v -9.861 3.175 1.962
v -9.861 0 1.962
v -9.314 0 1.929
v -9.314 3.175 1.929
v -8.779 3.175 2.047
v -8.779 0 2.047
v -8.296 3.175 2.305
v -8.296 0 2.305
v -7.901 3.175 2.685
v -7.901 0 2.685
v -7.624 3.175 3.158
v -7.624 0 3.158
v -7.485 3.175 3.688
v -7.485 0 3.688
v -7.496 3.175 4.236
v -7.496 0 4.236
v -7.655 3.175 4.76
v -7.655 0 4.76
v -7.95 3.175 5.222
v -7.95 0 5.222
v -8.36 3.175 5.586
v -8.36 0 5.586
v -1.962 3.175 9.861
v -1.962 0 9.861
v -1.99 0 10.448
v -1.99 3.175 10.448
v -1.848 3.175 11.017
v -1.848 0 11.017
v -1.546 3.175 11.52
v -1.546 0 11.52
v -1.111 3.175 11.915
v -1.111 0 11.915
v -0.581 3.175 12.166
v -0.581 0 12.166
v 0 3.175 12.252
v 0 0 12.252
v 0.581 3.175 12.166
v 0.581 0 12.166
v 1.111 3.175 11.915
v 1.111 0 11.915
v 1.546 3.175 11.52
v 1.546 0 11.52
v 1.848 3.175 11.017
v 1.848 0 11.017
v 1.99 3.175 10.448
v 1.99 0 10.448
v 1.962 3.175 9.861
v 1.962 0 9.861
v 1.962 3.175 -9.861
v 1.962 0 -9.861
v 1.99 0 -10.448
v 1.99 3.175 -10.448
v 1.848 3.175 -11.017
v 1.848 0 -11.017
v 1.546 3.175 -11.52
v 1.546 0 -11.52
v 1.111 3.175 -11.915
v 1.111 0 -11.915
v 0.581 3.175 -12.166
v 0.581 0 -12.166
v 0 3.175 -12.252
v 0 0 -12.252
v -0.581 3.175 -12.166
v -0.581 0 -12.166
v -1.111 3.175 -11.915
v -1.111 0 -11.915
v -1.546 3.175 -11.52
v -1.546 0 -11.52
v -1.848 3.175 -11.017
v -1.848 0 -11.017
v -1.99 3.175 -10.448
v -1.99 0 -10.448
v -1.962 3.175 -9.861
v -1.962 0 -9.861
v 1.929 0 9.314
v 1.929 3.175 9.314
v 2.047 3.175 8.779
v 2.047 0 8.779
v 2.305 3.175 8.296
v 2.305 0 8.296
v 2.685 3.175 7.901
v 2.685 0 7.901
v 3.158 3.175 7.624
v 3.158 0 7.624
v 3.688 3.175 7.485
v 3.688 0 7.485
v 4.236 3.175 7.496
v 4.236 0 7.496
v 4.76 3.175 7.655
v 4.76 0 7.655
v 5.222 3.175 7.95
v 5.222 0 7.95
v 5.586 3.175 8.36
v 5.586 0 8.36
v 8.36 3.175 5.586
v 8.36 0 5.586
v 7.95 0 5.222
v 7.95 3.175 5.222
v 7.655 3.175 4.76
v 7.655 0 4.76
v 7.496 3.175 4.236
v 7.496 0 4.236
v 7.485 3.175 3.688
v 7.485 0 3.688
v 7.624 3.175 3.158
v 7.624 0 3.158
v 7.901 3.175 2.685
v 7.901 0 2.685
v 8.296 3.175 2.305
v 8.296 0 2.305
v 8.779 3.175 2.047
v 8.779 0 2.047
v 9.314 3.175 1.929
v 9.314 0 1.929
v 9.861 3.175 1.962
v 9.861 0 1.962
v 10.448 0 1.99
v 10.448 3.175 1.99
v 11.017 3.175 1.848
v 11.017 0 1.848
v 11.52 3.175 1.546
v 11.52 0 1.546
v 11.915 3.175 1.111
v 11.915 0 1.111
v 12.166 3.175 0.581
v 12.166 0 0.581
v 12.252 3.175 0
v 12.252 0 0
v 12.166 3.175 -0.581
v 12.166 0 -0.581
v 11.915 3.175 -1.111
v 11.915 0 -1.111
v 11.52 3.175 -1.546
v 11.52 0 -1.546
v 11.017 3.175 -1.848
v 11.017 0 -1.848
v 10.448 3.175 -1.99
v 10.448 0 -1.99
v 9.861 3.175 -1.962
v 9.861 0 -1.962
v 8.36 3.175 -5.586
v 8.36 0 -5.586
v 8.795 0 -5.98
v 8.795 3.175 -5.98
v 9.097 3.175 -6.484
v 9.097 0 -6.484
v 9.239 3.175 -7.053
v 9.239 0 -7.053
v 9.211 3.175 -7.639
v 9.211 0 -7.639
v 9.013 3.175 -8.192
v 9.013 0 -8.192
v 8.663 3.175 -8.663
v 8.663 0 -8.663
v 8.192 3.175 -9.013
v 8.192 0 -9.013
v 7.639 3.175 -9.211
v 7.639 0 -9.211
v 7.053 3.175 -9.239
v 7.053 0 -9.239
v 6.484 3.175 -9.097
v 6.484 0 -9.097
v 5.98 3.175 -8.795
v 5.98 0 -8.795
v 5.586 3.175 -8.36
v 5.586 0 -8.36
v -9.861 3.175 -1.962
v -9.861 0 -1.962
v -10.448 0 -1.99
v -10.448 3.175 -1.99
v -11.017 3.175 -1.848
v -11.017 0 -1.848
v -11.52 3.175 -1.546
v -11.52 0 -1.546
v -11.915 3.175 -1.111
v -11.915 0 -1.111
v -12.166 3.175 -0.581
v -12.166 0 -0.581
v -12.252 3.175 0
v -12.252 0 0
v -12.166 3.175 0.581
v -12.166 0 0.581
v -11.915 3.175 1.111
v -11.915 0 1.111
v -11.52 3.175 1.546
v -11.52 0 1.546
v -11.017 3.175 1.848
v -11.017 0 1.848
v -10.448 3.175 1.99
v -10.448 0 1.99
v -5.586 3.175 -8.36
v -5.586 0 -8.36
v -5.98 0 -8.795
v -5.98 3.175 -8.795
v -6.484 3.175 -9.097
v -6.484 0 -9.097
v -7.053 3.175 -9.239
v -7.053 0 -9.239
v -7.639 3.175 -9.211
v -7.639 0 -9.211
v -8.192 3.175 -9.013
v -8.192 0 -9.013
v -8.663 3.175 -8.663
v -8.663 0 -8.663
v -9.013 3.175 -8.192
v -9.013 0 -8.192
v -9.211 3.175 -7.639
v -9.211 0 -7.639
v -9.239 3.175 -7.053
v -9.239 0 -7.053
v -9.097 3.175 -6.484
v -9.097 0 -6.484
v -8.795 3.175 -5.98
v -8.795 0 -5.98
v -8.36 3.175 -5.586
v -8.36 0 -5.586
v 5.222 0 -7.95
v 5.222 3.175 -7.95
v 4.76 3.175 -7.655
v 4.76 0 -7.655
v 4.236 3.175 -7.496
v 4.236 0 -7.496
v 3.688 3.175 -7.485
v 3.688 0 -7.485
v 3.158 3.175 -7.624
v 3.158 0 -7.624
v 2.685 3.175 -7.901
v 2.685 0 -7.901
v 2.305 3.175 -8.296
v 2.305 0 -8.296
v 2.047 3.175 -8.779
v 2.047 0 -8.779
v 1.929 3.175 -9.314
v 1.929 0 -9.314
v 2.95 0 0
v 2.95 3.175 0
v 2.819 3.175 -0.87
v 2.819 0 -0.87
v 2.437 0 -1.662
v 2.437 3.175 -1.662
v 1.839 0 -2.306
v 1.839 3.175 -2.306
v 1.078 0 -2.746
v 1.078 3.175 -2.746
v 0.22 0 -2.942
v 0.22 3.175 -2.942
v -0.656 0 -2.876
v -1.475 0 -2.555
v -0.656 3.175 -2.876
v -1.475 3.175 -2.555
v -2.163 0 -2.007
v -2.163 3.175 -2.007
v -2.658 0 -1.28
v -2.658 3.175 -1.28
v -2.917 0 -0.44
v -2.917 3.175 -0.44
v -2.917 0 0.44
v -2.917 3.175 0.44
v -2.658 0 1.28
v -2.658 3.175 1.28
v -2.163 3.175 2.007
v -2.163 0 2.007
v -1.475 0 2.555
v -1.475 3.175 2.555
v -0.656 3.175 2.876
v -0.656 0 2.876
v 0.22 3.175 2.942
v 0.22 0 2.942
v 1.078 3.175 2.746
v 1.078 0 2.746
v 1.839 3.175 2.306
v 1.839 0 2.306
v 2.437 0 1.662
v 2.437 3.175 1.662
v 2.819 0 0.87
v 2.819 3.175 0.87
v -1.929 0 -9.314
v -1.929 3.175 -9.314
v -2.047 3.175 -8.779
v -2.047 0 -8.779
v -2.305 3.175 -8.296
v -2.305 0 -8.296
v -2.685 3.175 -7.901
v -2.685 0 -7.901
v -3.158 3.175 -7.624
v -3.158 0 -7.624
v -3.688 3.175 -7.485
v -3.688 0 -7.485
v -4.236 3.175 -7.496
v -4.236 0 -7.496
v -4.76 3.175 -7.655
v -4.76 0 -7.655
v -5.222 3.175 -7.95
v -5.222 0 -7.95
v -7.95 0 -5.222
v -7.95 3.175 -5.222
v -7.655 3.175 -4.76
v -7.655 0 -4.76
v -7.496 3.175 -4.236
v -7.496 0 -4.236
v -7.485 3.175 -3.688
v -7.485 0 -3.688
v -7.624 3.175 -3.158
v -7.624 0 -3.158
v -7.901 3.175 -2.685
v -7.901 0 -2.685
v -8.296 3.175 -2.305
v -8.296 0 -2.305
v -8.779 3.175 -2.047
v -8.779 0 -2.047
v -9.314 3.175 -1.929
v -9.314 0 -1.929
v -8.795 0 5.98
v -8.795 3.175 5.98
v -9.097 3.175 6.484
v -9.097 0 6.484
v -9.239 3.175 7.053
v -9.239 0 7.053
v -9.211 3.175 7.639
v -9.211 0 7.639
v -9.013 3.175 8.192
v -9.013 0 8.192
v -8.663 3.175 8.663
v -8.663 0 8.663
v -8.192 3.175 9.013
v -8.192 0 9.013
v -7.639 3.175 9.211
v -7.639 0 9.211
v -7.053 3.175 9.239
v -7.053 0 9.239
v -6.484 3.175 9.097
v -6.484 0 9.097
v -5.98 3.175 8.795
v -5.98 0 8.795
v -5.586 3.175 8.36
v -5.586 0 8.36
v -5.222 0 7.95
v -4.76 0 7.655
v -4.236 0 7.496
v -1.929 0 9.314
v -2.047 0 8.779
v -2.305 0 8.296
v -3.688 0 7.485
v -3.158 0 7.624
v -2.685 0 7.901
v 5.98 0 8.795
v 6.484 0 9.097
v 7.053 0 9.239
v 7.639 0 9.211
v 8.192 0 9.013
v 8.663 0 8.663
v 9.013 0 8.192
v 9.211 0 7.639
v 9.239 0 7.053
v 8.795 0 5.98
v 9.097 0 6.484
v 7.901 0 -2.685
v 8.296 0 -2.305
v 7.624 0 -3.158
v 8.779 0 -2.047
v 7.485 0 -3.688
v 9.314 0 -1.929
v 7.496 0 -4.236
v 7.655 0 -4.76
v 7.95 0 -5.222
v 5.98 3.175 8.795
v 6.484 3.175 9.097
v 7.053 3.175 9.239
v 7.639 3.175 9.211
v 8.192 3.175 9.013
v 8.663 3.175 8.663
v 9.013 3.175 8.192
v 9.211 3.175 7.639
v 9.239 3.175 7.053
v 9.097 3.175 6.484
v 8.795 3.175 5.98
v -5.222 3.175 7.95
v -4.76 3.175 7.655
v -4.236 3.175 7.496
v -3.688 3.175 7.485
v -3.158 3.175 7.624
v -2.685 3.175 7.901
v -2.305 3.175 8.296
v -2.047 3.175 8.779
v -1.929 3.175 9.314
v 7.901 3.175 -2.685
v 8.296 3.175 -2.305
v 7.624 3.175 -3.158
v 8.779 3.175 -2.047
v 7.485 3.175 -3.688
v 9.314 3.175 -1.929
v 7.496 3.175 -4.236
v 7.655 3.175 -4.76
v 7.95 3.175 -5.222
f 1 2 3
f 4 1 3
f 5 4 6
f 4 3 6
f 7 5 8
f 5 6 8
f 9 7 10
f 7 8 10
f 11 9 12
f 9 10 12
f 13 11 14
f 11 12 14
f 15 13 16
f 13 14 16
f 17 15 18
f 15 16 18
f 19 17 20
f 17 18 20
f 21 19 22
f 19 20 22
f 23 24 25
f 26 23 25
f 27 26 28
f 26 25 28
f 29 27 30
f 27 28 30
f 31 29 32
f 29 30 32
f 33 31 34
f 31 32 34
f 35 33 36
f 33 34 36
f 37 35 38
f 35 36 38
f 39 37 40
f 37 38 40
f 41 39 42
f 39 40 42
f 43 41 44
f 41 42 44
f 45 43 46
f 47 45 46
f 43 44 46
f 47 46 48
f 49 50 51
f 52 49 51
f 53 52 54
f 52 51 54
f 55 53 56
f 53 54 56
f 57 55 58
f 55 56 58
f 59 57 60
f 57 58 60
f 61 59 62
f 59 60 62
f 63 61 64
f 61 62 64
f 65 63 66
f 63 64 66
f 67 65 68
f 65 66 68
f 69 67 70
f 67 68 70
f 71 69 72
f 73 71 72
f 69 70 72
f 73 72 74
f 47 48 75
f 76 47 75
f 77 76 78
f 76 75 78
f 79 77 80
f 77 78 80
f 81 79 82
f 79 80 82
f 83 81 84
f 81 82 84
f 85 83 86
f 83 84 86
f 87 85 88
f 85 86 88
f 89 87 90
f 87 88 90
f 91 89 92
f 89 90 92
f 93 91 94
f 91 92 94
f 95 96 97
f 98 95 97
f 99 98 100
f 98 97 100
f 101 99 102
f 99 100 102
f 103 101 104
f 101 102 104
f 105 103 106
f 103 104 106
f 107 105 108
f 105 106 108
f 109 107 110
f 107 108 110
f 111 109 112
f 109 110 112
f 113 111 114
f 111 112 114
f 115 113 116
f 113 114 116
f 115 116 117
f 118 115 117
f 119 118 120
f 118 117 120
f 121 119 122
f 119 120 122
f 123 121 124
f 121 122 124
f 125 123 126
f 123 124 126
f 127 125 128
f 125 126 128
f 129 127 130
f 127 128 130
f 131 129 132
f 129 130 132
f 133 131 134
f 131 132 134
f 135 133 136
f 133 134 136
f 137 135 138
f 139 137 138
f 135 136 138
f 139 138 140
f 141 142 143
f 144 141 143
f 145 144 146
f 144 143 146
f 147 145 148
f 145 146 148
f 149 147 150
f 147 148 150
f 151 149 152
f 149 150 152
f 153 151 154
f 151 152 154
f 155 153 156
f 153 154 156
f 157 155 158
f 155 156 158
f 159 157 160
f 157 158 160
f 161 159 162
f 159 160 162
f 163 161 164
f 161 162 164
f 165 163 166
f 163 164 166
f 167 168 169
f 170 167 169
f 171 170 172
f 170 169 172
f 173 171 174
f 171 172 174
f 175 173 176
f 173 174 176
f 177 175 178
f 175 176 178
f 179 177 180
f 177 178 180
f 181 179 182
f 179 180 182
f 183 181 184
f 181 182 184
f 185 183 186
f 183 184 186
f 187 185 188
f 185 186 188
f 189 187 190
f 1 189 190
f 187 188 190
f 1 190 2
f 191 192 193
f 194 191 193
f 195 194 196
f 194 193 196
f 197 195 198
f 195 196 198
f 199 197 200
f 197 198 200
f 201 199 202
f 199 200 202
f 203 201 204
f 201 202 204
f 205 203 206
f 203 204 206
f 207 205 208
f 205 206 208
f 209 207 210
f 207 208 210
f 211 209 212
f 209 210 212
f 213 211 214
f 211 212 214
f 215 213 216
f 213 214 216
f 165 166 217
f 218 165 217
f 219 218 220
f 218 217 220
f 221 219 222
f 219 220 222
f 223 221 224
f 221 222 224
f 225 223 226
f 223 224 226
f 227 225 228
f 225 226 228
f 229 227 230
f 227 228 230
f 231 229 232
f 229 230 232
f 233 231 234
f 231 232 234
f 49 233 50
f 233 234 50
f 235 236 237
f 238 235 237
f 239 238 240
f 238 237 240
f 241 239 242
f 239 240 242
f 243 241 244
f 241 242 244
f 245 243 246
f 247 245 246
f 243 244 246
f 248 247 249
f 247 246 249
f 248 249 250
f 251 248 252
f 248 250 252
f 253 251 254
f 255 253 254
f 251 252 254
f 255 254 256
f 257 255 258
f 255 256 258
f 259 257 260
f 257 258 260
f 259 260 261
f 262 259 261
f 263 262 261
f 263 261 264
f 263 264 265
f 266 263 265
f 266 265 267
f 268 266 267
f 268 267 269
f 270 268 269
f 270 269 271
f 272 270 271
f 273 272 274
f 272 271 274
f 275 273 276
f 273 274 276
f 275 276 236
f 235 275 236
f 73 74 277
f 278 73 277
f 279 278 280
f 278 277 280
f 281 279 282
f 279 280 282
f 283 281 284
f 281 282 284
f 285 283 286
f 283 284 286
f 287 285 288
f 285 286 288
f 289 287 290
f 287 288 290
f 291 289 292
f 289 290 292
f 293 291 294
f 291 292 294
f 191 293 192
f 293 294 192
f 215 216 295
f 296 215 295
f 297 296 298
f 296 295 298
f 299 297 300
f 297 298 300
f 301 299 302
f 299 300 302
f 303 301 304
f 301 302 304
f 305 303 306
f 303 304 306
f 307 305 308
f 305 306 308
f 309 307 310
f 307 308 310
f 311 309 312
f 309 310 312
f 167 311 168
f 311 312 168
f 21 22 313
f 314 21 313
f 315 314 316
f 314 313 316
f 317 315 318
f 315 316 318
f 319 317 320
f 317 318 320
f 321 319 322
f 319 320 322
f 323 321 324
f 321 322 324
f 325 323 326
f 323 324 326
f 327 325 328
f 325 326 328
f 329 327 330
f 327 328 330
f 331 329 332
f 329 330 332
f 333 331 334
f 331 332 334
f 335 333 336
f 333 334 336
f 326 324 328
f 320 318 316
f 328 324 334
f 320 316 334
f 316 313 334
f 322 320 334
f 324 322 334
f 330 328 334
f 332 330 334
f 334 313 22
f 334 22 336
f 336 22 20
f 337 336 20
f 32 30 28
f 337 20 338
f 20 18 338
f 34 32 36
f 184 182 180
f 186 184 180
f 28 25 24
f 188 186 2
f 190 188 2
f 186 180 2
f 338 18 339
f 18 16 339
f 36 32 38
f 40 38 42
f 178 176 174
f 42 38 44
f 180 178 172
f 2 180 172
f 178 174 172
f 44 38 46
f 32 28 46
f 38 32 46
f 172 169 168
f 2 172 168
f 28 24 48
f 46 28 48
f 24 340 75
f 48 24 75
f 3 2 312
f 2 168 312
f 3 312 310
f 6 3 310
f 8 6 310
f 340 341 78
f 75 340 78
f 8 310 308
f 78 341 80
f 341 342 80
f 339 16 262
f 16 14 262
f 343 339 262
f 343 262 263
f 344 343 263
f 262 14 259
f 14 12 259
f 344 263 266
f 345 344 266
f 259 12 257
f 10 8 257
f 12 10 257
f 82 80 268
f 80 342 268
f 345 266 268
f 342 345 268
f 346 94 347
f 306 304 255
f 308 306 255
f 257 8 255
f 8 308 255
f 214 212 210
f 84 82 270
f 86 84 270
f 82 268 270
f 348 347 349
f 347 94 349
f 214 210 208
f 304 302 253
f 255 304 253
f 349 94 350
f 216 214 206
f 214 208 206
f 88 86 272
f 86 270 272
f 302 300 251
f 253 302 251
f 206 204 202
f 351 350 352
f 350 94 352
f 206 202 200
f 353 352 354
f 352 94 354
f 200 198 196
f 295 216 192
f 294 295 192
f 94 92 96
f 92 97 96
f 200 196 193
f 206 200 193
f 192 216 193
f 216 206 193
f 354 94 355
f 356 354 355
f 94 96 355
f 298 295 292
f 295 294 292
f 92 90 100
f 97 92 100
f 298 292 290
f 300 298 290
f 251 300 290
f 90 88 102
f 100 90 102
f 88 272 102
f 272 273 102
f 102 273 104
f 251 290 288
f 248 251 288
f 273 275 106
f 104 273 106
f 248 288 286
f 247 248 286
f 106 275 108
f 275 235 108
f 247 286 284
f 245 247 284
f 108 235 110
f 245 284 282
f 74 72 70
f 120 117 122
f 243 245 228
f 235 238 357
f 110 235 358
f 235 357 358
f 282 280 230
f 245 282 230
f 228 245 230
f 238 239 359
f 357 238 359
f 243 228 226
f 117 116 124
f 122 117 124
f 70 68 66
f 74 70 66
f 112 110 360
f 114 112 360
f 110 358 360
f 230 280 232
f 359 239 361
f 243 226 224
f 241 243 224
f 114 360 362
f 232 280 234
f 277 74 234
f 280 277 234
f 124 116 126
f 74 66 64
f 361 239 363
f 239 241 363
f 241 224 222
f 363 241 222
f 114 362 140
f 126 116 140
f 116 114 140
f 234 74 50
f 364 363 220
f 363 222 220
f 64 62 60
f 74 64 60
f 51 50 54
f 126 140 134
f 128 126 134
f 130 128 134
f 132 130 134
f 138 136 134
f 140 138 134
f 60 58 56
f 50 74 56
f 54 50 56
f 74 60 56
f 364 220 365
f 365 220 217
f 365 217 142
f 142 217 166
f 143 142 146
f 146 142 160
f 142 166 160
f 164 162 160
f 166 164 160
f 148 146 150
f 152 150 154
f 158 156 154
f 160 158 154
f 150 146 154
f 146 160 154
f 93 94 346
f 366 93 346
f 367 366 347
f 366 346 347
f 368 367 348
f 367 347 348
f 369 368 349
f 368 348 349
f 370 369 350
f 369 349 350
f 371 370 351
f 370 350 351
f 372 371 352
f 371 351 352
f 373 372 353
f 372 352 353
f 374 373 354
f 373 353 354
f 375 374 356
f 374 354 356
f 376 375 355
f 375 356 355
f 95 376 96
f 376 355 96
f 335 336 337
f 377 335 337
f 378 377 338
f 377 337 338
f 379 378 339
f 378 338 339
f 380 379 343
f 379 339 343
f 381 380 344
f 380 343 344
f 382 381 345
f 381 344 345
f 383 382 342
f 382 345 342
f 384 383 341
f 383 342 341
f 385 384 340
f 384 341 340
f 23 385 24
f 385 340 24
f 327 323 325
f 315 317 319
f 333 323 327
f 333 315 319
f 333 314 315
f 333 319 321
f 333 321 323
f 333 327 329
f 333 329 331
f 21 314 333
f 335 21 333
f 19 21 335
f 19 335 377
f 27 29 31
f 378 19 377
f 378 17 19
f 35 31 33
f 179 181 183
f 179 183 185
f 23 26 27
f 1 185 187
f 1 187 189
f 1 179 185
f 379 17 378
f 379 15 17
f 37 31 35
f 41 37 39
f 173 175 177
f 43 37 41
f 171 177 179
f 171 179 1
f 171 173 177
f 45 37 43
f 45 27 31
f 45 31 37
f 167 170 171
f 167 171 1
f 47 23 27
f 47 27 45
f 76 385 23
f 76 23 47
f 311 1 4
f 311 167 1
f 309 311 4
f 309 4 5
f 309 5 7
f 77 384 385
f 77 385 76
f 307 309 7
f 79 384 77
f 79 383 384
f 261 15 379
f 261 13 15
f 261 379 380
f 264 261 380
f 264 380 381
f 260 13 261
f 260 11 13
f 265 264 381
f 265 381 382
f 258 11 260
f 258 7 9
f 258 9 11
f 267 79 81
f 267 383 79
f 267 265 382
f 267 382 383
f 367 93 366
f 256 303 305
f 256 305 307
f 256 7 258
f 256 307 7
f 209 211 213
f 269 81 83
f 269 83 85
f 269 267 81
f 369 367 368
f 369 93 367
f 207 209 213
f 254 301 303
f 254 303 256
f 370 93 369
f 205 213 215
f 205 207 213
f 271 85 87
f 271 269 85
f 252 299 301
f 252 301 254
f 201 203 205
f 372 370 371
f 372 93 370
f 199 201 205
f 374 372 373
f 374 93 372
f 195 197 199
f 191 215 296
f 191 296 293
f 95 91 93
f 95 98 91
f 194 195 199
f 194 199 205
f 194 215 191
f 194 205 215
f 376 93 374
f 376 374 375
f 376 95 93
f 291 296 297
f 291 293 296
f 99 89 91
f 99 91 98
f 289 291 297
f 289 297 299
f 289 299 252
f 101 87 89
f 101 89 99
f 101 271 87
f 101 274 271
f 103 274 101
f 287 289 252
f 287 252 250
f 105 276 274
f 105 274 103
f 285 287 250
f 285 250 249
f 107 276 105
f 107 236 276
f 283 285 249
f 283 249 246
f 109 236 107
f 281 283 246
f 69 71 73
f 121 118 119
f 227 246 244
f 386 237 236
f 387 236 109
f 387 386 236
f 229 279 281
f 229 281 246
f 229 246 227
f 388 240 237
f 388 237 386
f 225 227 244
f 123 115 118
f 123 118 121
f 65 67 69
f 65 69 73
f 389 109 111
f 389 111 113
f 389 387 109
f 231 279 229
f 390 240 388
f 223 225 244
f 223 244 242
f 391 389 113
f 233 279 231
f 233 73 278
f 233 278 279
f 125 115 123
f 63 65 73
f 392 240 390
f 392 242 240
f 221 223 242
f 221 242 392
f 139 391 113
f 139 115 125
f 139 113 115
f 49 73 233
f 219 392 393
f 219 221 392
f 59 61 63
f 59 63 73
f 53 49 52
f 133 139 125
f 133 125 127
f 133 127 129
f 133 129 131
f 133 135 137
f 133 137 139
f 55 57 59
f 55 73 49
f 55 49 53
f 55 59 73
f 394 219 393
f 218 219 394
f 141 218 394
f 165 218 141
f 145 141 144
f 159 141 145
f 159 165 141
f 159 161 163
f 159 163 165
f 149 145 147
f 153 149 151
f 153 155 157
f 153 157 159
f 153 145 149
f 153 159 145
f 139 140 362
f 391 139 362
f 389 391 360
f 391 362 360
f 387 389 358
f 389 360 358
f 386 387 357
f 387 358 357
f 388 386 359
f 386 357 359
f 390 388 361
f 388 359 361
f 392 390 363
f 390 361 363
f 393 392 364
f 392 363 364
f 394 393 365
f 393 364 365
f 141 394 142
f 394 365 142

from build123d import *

# Parameters (mm, degrees)
SKETCH1_R           = 4
BOSS_EXTRUDE1_DEPTH = 3.175
SKETCH2_R           = 4
SKETCH2_R_2         = 2.95
BOSS_EXTRUDE2_DEPTH = 3.175


with BuildPart() as part:
    # Sketch1 → Boss-Extrude1 (new body)
    with BuildSketch(Plane(origin=(0, 0, 0), x_dir=(1, 0, 0), z_dir=(0, 1, 0))):
        with BuildLine():
            ThreePointArc((1.961570561, 9.861481147), (0, 12.251661791), (-1.961570561, 9.861481147))
            ThreePointArc((-1.961570561, 9.861481147), (-3.157774257, 7.623541438), (-5.586080346, 8.360160037))
            ThreePointArc((-5.586080346, 8.360160037), (-8.663233133, 8.663233133), (-8.360160037, 5.586080346))
            ThreePointArc((-8.360160037, 5.586080346), (-7.623541438, 3.157774257), (-9.861481147, 1.961570561))
            ThreePointArc((-9.861481147, 1.961570561), (-12.251661791, 0), (-9.861481147, -1.961570561))
            ThreePointArc((-9.861481147, -1.961570561), (-7.623541438, -3.157774257), (-8.360160037, -5.586080346))
            ThreePointArc((-8.360160037, -5.586080346), (-8.663233133, -8.663233133), (-5.586080346, -8.360160037))
            ThreePointArc((-5.586080346, -8.360160037), (-3.157774257, -7.623541438), (-1.961570561, -9.861481147))
            ThreePointArc((-1.961570561, -9.861481147), (0, -12.251661791), (1.961570561, -9.861481147))
            ThreePointArc((1.961570561, -9.861481147), (3.157774257, -7.623541438), (5.586080346, -8.360160037))
            ThreePointArc((5.586080346, -8.360160037), (8.663233133, -8.663233133), (8.360160037, -5.586080346))
            ThreePointArc((8.360160037, -5.586080346), (7.623541438, -3.157774257), (9.861481147, -1.961570561))
            ThreePointArc((9.861481147, -1.961570561), (12.251661791, 0), (9.861481147, 1.961570561))
            ThreePointArc((9.861481147, 1.961570561), (7.623541438, 3.157774257), (8.360160037, 5.586080346))
            ThreePointArc((8.360160037, 5.586080346), (8.663233133, 8.663233133), (5.586080346, 8.360160037))
            ThreePointArc((5.586080346, 8.360160037), (3.157774257, 7.623541438), (1.961570561, 9.861481147))
        make_face()
        Circle(SKETCH1_R, mode=Mode.SUBTRACT)
    extrude(amount=BOSS_EXTRUDE1_DEPTH)

    # Sketch2 → Boss-Extrude2 (add)
    with BuildSketch(Plane(origin=(0, 3.175, 0), x_dir=(1, 0, 0), z_dir=(0, 1, 0))):
        Circle(SKETCH2_R)
        Circle(SKETCH2_R_2, mode=Mode.SUBTRACT)
    extrude(amount=-BOSS_EXTRUDE2_DEPTH)


solid = part.part
